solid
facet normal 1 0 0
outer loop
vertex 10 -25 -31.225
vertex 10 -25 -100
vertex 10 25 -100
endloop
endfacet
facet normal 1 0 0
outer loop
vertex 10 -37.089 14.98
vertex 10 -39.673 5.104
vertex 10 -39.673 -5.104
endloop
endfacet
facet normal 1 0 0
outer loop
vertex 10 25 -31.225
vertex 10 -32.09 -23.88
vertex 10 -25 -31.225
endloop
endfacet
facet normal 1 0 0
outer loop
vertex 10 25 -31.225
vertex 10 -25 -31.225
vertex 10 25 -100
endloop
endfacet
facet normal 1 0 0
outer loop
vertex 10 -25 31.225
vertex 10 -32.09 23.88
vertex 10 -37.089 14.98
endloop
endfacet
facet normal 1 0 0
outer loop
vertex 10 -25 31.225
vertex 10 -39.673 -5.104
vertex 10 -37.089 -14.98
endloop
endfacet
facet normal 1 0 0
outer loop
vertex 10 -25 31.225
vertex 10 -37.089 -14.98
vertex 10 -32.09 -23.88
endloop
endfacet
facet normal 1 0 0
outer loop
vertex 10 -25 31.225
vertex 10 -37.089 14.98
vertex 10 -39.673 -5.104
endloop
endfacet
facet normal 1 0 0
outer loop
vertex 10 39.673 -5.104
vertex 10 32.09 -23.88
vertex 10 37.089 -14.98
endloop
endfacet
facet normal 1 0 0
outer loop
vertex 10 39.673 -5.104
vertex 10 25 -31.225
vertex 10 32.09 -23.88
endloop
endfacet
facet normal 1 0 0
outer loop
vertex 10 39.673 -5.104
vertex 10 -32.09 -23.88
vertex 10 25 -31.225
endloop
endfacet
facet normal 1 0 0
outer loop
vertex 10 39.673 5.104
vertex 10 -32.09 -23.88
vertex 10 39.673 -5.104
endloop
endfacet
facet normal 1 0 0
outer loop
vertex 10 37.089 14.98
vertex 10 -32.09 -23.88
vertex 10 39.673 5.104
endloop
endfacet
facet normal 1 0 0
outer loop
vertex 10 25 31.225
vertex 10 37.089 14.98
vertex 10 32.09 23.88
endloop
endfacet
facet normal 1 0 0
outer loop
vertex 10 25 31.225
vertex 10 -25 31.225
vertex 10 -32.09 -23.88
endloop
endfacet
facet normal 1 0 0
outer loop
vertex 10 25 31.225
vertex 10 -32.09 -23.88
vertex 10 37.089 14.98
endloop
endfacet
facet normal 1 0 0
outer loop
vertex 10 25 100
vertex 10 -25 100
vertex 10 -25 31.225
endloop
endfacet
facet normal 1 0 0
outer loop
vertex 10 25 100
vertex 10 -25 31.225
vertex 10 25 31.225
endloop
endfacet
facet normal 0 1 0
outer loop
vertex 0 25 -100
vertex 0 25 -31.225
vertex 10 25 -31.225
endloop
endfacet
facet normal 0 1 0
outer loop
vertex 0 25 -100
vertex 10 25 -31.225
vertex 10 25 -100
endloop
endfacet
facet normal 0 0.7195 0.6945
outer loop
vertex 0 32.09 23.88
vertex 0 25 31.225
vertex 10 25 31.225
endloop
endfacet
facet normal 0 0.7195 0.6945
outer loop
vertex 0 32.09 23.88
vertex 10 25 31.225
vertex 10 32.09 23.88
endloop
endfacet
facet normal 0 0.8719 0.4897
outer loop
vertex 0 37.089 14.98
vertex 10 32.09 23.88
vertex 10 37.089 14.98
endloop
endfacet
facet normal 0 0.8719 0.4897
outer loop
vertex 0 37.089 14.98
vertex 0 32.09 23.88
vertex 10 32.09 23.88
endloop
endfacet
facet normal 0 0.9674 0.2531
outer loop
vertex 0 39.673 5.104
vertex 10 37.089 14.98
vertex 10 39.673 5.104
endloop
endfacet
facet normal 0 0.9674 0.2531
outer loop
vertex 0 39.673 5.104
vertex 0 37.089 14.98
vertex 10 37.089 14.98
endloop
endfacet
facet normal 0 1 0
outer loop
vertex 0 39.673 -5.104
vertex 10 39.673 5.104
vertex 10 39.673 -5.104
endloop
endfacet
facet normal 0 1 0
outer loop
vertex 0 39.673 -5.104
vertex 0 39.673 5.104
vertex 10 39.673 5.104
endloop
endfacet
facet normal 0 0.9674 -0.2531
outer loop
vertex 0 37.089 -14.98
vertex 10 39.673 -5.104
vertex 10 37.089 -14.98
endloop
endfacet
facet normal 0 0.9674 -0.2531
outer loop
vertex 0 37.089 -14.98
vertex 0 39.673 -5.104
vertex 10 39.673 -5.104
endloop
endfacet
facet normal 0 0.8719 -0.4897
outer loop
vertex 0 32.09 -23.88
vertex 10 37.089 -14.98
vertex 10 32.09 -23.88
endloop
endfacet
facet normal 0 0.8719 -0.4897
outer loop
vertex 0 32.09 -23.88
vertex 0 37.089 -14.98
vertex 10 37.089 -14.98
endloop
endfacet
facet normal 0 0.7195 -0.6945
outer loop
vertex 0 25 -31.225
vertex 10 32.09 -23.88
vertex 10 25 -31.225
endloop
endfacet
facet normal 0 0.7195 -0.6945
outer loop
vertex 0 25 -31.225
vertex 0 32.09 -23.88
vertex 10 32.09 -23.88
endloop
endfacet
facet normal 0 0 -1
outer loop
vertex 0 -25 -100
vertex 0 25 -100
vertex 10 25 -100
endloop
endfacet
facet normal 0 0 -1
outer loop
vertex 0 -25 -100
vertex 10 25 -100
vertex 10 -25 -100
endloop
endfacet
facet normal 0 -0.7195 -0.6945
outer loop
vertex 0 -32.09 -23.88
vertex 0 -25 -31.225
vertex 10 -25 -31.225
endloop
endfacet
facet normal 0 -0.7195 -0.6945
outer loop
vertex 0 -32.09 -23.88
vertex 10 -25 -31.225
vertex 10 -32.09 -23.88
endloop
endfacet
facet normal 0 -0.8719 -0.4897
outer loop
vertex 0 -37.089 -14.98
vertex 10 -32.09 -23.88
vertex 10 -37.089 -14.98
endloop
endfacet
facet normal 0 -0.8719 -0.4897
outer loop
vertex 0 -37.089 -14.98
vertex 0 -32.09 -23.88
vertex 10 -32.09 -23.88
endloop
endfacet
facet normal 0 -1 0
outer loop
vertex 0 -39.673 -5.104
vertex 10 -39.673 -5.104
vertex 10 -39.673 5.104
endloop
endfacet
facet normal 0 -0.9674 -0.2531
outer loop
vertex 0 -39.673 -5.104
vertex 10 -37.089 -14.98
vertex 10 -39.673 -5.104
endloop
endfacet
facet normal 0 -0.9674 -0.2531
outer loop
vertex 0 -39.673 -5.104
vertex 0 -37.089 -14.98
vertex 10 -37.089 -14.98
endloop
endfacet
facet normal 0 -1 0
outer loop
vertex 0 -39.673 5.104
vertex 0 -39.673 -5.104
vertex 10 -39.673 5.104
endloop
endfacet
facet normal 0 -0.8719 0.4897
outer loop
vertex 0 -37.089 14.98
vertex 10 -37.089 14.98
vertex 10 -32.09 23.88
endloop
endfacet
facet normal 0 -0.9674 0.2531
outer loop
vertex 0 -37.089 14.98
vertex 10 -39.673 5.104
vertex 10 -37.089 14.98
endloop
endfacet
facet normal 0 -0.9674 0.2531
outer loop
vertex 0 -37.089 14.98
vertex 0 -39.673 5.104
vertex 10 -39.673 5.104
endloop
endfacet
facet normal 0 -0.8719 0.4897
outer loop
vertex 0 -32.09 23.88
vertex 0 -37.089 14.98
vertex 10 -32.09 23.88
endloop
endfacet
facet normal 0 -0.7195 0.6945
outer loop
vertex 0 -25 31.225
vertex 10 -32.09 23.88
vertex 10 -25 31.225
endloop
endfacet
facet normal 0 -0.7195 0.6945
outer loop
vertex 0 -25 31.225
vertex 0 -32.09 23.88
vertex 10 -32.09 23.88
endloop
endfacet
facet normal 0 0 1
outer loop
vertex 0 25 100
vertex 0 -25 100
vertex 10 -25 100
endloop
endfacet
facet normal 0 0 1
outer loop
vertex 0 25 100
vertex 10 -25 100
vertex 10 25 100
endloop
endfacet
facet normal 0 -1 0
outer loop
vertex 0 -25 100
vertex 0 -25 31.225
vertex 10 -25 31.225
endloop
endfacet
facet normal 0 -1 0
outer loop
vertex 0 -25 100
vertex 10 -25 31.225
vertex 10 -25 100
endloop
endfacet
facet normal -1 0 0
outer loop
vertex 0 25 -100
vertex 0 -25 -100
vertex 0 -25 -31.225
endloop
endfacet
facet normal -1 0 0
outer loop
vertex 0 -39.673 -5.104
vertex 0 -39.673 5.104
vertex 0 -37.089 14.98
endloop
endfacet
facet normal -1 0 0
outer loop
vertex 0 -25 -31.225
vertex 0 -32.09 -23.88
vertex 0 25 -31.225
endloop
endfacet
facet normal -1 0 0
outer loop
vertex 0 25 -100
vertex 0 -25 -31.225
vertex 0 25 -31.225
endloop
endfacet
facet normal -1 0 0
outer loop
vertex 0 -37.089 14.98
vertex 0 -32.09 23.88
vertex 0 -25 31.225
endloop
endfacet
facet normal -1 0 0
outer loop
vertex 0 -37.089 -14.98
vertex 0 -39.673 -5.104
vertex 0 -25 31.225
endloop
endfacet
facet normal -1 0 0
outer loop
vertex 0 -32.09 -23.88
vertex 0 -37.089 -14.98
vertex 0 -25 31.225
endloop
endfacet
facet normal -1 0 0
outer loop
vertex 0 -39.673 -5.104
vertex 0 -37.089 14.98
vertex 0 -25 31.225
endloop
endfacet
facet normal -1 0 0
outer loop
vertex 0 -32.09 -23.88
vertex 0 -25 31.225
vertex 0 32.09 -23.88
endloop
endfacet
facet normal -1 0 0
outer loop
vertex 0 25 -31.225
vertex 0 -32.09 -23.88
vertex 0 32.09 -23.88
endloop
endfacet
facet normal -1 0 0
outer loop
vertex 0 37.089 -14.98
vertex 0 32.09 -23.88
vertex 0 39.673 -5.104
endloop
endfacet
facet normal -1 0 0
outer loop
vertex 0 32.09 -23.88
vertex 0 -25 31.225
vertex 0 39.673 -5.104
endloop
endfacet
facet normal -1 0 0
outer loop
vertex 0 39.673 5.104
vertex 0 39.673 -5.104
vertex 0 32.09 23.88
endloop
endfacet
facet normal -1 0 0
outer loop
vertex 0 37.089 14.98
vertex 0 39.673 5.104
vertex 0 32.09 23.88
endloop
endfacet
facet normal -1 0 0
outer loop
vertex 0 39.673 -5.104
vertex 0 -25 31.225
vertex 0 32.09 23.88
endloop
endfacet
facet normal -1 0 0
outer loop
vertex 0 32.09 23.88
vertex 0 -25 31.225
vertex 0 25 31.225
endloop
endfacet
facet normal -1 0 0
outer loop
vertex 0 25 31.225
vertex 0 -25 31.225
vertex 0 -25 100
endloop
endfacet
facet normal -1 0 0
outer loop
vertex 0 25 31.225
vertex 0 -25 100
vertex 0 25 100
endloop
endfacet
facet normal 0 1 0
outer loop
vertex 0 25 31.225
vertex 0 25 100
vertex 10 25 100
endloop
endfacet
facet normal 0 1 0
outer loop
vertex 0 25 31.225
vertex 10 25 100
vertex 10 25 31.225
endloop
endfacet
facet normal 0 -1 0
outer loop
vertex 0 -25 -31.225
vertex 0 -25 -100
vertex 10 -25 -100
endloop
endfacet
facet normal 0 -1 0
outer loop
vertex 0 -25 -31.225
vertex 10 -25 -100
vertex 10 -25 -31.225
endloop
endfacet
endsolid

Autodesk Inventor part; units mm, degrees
ref_plane "YZ Plane" through (0, 0, 0) normal (1, 0, 0) x (0, 1, 0)
ref_plane "XZ Plane" through (0, 0, 0) normal (0, 1, 0) x (-1, 0, 0)
ref_plane "XY Plane" through (0, 0, 0) normal (0, 0, 1) x (1, 0, 0)
sketch "スケッチ1" plane through (0, 0, 0) normal (1, 0, 0) x (0, 1, 0)
  circle A0 centre (0, 0) radius 40
  line L0 (-25, 100) -> (25, 100)
  line L1 (25, 100) -> (25, -100)
  line L2 (25, -100) -> (-25, -100)
  line L3 (-25, -100) -> (-25, 100)
  line L4 (-25, 100) -> (25, -100) construction
  line L5 (25, 100) -> (-25, -100) construction
  point P0 (25, -31.225)
  point P1 (25, 31.225)
  point P2 (-25, 31.225)
  point P3 (-25, -31.225)
  dimension "d0" = 80
  dimension "d1" = 50
  dimension "d2" = 200
extrude "押し出し1" add sketch "スケッチ1" along normal blind 10
ref_plane "作業平面1" through (0, -25, 0) normal (0, 0, 1) x (1, 0, 0)
properties part number "leg_base_plate"
